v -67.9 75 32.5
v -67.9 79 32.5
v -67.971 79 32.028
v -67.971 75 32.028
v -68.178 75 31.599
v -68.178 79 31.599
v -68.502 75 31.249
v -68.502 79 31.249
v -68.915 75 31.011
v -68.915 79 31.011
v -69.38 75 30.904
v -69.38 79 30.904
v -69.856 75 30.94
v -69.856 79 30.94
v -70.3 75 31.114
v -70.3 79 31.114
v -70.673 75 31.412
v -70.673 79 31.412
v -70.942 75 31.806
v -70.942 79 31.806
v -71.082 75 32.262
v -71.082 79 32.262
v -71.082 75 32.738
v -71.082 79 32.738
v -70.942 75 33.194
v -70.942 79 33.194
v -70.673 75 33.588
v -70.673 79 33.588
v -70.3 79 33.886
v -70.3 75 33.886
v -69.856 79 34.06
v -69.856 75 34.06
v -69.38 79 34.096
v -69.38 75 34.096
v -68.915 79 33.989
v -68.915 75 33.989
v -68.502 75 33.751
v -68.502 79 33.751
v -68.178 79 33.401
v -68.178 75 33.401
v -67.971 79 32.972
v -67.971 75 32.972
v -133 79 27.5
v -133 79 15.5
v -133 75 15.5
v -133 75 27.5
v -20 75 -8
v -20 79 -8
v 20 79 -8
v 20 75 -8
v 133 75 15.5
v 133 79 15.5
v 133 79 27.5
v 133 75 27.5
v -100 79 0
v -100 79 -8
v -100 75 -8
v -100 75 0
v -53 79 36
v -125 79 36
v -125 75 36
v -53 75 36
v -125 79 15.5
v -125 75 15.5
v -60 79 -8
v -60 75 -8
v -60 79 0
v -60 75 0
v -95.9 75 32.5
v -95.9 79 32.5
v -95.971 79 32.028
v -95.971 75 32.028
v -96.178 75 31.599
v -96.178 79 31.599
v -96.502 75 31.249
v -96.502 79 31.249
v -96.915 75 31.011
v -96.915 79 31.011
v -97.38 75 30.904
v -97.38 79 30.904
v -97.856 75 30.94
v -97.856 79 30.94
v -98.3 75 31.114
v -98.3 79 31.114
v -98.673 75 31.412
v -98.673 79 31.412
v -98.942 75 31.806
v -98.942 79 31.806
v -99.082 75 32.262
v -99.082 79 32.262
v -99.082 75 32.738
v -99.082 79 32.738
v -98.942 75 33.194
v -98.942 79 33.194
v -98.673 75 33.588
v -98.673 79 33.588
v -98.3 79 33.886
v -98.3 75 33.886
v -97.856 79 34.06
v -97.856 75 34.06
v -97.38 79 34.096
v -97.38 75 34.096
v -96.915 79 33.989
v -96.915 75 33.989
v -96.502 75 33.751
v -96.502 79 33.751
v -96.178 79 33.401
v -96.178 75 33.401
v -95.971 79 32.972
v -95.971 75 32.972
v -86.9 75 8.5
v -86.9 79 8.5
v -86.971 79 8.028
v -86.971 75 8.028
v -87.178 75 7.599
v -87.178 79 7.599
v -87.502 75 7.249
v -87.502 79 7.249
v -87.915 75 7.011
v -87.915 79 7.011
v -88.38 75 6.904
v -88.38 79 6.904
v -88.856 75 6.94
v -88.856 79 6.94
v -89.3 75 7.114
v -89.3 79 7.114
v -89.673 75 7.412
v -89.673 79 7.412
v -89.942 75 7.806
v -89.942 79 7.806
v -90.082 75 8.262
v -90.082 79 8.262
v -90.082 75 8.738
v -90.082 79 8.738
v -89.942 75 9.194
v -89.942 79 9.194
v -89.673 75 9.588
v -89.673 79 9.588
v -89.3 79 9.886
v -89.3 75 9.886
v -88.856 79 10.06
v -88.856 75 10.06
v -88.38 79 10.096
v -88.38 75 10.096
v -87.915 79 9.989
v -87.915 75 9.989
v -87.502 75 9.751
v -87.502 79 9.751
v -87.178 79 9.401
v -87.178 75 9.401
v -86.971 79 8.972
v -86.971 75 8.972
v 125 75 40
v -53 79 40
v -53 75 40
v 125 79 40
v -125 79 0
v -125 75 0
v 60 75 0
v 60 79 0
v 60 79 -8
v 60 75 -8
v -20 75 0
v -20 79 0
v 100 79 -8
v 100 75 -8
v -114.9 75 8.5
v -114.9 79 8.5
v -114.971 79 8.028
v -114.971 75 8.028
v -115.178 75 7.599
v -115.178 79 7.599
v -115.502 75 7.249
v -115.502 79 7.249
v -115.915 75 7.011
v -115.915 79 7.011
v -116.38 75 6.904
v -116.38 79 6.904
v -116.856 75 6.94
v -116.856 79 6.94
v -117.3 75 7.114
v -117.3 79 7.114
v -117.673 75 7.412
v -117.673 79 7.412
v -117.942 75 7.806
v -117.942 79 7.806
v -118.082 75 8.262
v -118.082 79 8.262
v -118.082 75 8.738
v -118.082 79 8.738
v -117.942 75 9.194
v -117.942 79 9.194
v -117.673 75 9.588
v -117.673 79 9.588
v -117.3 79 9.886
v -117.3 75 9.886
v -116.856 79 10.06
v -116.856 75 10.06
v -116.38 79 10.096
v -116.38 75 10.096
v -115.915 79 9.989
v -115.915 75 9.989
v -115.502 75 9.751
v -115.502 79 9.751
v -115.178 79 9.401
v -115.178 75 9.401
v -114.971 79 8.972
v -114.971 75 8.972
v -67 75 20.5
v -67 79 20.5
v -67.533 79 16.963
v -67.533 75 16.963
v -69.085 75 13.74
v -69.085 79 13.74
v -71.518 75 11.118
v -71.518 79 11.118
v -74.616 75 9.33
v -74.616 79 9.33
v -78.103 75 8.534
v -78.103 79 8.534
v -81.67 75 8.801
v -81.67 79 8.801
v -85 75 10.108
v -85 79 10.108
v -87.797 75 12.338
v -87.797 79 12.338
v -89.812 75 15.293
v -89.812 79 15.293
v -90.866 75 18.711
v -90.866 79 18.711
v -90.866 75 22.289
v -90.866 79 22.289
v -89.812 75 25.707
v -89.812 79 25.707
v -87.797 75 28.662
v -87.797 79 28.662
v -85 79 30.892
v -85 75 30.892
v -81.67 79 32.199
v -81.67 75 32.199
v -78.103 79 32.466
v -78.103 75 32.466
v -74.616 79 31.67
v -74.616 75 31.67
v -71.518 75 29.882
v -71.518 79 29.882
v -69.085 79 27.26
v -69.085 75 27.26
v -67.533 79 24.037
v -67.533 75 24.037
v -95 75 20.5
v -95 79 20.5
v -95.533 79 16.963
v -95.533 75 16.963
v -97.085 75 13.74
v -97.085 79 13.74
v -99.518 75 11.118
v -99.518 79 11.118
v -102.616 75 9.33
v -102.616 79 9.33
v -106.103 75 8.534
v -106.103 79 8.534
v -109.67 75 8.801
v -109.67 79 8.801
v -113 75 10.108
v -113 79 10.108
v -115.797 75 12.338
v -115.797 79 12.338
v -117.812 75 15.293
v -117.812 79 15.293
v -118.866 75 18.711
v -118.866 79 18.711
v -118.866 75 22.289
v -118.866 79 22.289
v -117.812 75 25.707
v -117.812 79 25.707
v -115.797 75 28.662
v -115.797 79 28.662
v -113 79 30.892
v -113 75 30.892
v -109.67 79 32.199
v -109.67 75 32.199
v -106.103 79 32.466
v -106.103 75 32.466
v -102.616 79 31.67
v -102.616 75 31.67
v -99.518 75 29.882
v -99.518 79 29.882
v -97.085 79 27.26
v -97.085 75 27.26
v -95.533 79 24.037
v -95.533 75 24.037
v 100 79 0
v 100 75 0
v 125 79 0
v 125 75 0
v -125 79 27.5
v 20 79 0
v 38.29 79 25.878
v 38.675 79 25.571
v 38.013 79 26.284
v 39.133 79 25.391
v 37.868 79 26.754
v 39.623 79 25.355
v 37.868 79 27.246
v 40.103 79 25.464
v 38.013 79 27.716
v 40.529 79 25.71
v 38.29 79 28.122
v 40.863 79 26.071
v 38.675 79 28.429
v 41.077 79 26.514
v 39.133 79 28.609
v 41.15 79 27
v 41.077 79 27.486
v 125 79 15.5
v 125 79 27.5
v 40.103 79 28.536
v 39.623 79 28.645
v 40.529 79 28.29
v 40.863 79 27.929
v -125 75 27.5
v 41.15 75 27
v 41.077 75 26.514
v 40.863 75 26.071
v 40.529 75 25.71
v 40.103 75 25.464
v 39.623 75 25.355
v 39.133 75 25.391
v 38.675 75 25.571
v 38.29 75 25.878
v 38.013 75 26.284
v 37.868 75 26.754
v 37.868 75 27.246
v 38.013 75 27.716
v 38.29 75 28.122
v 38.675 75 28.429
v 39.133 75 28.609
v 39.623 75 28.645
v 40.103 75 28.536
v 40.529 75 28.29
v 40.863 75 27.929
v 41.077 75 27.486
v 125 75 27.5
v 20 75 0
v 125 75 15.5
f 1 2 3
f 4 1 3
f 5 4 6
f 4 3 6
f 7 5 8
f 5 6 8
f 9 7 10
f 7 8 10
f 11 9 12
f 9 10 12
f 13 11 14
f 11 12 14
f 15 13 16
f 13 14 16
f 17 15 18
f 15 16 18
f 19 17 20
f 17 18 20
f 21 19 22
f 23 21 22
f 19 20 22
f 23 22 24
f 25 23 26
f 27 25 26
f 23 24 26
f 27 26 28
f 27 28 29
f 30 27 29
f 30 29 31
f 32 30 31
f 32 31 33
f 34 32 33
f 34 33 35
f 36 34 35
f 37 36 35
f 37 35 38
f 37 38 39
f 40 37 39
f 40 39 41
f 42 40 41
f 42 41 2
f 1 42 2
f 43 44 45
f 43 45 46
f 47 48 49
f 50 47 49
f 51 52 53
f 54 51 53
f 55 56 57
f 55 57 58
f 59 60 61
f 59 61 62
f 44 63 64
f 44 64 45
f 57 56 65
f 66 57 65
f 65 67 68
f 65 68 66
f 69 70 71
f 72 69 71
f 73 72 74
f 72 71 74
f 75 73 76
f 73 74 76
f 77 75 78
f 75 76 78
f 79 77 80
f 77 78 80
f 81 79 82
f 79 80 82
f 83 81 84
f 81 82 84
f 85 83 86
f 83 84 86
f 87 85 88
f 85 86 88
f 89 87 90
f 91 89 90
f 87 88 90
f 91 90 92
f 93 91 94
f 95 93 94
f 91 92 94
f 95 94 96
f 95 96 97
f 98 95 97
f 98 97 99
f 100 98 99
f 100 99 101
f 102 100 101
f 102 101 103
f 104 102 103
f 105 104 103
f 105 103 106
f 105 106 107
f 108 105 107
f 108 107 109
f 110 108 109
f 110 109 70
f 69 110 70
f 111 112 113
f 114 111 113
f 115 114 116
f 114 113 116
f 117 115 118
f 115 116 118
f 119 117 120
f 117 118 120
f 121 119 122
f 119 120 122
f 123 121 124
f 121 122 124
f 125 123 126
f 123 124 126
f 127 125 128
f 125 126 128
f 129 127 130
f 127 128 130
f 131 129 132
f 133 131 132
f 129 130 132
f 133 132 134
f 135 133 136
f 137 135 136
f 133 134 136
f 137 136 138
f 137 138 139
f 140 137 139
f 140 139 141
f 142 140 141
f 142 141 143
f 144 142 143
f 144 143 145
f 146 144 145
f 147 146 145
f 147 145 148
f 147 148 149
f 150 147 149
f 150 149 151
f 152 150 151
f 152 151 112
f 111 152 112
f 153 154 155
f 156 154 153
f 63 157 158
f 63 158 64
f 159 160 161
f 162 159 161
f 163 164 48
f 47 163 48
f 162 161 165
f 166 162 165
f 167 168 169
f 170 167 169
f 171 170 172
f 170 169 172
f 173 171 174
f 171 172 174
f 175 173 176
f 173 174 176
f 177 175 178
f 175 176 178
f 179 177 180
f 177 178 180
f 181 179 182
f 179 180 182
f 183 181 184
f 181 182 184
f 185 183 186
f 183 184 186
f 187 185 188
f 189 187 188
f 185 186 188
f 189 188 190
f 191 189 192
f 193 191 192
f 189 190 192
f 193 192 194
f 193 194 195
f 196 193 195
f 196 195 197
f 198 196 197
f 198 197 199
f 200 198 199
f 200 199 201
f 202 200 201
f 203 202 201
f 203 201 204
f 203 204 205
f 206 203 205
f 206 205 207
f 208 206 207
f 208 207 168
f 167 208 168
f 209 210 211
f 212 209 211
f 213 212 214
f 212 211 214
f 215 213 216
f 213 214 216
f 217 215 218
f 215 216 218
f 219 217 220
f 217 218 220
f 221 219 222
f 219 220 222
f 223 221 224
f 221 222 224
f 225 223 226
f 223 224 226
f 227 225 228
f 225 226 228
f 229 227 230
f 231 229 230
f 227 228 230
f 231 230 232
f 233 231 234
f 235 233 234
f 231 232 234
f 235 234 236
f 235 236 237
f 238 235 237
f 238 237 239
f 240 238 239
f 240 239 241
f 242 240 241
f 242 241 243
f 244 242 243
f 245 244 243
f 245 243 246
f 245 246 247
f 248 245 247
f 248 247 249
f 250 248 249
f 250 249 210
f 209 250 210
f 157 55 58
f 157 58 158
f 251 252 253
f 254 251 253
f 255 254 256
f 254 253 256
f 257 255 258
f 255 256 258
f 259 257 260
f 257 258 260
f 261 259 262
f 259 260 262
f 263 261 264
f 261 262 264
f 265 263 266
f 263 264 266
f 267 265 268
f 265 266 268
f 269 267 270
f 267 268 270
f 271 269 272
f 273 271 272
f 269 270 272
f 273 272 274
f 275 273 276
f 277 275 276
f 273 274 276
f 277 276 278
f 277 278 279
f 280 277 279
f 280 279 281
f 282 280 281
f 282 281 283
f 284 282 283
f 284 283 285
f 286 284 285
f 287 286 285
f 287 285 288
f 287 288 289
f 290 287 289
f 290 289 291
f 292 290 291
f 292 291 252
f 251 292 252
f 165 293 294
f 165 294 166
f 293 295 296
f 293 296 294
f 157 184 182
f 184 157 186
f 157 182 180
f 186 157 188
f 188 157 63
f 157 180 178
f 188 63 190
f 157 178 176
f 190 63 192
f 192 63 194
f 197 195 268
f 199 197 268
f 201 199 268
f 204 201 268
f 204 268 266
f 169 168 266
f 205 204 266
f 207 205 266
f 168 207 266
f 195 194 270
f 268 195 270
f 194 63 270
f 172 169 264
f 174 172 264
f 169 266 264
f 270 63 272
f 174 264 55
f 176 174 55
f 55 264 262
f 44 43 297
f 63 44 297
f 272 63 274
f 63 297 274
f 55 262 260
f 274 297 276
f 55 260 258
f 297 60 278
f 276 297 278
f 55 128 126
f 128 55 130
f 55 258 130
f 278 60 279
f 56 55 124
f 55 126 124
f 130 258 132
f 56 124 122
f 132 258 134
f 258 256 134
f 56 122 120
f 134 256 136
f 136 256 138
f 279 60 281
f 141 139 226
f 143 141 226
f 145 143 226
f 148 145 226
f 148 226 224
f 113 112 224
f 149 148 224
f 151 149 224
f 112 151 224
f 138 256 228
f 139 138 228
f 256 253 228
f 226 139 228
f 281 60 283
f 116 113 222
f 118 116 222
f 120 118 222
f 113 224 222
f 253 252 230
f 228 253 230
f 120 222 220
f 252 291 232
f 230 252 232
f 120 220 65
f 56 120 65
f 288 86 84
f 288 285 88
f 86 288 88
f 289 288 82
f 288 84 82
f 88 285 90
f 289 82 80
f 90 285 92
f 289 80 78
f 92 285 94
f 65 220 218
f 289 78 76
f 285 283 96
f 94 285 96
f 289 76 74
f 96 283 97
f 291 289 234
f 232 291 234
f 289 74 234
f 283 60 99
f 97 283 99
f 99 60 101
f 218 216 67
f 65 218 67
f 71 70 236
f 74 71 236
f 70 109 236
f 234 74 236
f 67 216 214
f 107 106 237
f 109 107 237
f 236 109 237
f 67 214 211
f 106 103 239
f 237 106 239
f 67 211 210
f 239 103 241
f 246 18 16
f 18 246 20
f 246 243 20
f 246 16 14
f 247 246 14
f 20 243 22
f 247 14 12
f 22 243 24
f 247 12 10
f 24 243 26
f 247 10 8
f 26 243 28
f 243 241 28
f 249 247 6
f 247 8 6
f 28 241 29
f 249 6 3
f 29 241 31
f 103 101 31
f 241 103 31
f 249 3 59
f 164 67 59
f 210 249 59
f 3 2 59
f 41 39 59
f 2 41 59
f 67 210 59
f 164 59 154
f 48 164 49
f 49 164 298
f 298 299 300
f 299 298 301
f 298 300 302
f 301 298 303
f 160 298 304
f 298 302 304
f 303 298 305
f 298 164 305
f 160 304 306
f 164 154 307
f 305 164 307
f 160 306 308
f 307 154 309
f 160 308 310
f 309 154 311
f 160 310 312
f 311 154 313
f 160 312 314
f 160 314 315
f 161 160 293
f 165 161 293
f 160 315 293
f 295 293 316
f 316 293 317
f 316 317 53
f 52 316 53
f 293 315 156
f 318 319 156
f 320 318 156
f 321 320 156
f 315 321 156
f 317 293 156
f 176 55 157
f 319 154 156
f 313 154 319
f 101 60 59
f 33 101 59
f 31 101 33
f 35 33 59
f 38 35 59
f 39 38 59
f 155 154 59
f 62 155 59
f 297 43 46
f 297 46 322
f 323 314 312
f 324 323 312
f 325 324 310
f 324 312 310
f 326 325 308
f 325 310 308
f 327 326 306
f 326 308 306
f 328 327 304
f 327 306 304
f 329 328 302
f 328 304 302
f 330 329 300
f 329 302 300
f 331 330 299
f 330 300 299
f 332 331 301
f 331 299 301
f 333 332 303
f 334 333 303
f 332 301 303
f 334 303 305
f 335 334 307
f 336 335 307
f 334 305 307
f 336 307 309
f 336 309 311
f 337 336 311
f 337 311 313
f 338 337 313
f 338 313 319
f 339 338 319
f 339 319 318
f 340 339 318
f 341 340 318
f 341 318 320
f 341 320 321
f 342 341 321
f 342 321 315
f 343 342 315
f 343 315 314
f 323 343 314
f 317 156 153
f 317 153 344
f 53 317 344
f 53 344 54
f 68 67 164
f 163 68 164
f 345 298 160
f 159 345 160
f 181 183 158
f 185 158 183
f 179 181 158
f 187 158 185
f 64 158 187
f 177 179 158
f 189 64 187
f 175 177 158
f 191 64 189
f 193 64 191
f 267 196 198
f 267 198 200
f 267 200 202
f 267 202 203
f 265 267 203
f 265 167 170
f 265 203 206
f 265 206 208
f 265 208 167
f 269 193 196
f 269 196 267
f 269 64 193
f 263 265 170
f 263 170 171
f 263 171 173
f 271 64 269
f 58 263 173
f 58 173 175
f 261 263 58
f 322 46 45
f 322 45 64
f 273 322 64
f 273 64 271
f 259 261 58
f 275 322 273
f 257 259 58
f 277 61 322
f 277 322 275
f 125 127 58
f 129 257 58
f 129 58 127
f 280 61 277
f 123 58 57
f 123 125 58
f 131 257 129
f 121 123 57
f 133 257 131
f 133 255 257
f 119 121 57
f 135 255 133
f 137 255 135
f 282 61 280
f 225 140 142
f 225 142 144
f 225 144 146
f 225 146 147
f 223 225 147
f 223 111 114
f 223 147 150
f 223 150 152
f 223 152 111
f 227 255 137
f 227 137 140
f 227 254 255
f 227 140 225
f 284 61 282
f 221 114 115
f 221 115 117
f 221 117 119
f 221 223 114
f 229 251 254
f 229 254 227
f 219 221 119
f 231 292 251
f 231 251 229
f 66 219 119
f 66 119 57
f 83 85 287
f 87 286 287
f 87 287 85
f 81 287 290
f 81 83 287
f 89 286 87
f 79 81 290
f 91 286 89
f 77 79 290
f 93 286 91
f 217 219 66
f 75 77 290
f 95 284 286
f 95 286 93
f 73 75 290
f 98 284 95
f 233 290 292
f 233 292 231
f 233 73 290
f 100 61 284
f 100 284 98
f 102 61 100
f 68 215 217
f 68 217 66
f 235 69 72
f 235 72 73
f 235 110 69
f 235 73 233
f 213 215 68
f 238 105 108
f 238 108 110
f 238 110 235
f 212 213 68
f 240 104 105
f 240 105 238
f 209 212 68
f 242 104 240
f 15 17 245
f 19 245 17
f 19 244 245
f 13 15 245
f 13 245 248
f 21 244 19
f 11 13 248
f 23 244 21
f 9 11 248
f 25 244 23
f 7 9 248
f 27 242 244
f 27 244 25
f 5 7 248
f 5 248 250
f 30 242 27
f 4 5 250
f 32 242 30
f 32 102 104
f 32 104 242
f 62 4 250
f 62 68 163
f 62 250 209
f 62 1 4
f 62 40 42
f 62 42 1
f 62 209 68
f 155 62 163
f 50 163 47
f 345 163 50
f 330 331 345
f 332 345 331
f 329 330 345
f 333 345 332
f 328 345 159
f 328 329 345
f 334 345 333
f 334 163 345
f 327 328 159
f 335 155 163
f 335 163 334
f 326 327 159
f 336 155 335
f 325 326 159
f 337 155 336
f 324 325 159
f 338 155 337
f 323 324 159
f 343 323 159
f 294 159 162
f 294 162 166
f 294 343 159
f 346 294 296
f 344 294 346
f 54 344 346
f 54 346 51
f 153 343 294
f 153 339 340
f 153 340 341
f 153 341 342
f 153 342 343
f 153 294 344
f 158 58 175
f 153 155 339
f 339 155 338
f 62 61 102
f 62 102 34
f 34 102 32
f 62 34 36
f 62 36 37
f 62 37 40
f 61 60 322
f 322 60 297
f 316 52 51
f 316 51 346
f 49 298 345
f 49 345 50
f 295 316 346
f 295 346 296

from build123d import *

# Parameters (mm, degrees)
SKETCH006_W     = 266
SKETCH006_H     = 48
PAD003_DEPTH    = 4
SKETCH024_W     = 40
SKETCH024_H     = 30
SKETCH024_W_2   = 30
SKETCH024_H_2   = 20
POCKET007_DEPTH = 4.001
SKETCH031_R     = 12
SKETCH031_R_2   = 1.6
POCKET014_DEPTH = 4.001
SKETCH040_R     = 1.65
HOLE005_DEPTH   = 4.001
SKETCH055_W     = 76
SKETCH055_H     = 10
POCKET021_DEPTH = 4.001


with BuildPart() as part:
    # Sketch006 (on DatumPlane) → Pad003 (new body)
    with BuildSketch(Plane.XZ.offset(-79)):
        with Locations((0, 16)):
            Rectangle(SKETCH006_W, SKETCH006_H)
    extrude(amount=PAD003_DEPTH)

    # Sketch024 (on Face5 of Pad003) → Pocket007 (cut, through all)
    with BuildSketch(Plane(origin=(0, 79, 0), x_dir=(1, 0, 0), z_dir=(0, 1, 0))):
        Polygon((-145, 30), (-100, 30), (-100, 0), (-125, 0), (-125, -15.5), (-155, -15.5), (-155, 4.5), (-145, 4.5), align=None)
        with Locations((-40, 15)):
            Rectangle(SKETCH024_W, SKETCH024_H)
        with Locations((40, 15)):
            Rectangle(SKETCH024_W, SKETCH024_H)
        Polygon((100, 30), (145, 30), (145, 4.5), (155, 4.5), (155, -15.5), (125, -15.5), (125, 0), (100, 0), align=None)
        with Locations((-140, -37.5)):
            Rectangle(SKETCH024_W_2, SKETCH024_H_2)
        with Locations((140, -37.5)):
            Rectangle(SKETCH024_W_2, SKETCH024_H_2)
    extrude(amount=-POCKET007_DEPTH, mode=Mode.SUBTRACT)

    # Sketch031 (on Face2 of Pocket007) → Pocket014 (cut, through all)
    with BuildSketch(Plane(origin=(0, 79, 0), x_dir=(1, 0, 0), z_dir=(0, 1, 0))):
        with Locations((-107, -20.5)):
            Circle(SKETCH031_R)
        with Locations((-116.5, -8.5)):
            Circle(SKETCH031_R_2)
        with Locations((-97.5, -32.5)):
            Circle(SKETCH031_R_2)
        with Locations((-88.5, -8.5)):
            Circle(SKETCH031_R_2)
        with Locations((-79, -20.5)):
            Circle(SKETCH031_R)
        with Locations((-69.5, -32.5)):
            Circle(SKETCH031_R_2)
    extrude(amount=-POCKET014_DEPTH, mode=Mode.SUBTRACT)

    # Sketch040 (on Face2 of Pocket014) → Hole005 (cut, through all)
    with BuildSketch(Plane(origin=(0, 79, 0), x_dir=(1, 0, 0), z_dir=(0, 1, 0))):
        with Locations((39.5, -27)):
            Circle(SKETCH040_R)
    extrude(amount=-HOLE005_DEPTH, mode=Mode.SUBTRACT)

    # Sketch055 (on Face2 of Pocket007) → Pocket021 (cut, through all)
    with BuildSketch(Plane(origin=(0, 79, 0), x_dir=(1, 0, 0), z_dir=(0, 1, 0))):
        with Locations((-91, -41)):
            Rectangle(SKETCH055_W, SKETCH055_H)
    extrude(amount=-POCKET021_DEPTH, mode=Mode.SUBTRACT)


solid = part.part
